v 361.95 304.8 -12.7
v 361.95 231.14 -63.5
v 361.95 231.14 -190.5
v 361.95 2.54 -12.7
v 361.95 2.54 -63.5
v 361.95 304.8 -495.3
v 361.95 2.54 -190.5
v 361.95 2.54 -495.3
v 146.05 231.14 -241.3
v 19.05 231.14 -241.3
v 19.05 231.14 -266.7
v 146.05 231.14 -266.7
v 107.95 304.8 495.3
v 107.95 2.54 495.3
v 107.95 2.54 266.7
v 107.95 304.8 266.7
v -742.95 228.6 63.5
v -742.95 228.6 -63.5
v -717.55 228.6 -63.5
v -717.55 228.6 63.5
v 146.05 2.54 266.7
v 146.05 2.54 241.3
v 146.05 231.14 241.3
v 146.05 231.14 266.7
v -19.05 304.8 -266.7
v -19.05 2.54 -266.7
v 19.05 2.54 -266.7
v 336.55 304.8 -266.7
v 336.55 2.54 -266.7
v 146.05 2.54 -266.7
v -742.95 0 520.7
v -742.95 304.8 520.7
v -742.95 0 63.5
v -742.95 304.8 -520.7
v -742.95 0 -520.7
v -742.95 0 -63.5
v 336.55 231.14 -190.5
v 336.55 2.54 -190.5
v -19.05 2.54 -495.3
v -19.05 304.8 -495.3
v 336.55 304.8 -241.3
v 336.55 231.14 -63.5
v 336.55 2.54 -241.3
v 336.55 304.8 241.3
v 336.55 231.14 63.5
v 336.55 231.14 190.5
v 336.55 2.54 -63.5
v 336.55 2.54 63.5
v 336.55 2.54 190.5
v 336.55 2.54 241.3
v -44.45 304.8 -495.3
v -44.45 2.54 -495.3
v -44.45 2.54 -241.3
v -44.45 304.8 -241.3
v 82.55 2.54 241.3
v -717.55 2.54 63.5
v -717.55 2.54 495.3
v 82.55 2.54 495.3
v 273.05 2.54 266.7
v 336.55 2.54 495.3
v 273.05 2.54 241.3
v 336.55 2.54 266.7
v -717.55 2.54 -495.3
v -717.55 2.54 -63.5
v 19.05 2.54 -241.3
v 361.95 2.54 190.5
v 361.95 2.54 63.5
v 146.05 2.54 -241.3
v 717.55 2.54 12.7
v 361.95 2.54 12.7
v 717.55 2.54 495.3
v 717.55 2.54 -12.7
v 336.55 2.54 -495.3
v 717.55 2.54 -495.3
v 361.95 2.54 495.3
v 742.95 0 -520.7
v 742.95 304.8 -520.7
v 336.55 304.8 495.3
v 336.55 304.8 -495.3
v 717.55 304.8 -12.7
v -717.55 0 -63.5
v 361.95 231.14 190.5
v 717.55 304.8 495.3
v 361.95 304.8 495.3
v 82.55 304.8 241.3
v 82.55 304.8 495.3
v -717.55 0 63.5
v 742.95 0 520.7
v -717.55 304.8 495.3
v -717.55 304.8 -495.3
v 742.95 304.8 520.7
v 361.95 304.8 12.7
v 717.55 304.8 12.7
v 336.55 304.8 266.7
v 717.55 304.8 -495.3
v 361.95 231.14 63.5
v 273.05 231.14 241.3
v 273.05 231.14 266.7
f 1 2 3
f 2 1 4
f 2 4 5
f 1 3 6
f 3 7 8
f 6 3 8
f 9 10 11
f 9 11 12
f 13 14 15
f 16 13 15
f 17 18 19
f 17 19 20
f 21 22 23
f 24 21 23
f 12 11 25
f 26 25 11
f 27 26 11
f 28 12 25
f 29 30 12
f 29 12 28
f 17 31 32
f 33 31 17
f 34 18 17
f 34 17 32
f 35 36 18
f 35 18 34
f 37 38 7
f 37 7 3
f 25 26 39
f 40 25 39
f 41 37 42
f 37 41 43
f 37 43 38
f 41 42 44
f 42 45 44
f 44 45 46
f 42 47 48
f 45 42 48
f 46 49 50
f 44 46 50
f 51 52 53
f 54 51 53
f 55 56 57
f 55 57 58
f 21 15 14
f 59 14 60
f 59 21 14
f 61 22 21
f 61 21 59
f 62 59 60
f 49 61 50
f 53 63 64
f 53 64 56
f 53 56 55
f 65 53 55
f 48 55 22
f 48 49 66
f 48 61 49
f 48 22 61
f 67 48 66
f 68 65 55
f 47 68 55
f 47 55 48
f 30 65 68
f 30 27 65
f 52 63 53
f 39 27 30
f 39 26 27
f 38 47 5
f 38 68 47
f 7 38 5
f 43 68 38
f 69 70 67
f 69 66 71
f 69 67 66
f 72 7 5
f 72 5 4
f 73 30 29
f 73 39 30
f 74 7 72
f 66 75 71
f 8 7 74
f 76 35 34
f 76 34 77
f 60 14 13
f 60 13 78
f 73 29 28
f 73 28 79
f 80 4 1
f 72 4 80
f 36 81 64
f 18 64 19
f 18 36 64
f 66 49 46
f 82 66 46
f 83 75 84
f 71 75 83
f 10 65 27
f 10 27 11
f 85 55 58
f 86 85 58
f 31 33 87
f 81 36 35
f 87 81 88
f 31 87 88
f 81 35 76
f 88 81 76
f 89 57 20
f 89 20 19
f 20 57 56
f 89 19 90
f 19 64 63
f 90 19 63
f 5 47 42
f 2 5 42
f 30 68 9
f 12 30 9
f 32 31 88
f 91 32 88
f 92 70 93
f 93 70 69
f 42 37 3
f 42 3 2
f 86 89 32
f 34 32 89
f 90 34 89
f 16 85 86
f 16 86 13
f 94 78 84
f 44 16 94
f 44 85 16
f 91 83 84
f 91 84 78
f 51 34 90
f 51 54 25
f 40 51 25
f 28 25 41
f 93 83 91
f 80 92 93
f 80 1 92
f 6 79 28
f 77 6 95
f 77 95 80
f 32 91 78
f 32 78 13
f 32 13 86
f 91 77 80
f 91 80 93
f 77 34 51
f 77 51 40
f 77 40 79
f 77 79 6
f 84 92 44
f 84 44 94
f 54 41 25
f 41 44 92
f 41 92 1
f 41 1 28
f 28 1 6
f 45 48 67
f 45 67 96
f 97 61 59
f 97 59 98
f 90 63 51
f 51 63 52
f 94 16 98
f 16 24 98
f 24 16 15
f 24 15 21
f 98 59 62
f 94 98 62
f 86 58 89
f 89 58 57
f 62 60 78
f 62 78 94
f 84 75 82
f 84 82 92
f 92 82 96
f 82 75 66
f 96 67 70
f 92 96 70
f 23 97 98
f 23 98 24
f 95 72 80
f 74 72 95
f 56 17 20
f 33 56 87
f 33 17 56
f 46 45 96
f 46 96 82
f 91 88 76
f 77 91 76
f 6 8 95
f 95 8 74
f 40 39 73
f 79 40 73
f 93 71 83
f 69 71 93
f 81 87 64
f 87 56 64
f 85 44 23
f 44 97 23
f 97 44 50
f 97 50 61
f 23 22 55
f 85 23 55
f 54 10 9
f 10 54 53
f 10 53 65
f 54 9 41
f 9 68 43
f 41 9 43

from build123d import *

# Parameters (mm, degrees)
EXTRUDE_THIN1_OUTLINE_W   = 1485.9
EXTRUDE_THIN1_OUTLINE_H   = 1041.4
EXTRUDE_THIN1_OUTLINE_W_2 = 228.6
EXTRUDE_THIN1_OUTLINE_H_2 = 228.6
EXTRUDE_THIN1_OUTLINE_W_3 = 355.6
EXTRUDE_THIN1_OUTLINE_H_3 = 482.6
EXTRUDE_THIN1_DEPTH       = 304.8
SKETCH1_5_W               = 1460.5
SKETCH1_5_H               = 1016
BOSS_EXTRUDE1_DEPTH       = 2.54
CUT_EXTRUDE1_DEPTH        = 25.4
SKETCH4_W                 = 127
SKETCH4_H                 = 228.6
CUT_EXTRUDE2_DEPTH        = 25.4
SKETCH5_W                 = 127
SKETCH5_H                 = 228.6
CUT_EXTRUDE3_DEPTH        = 25.4
SKETCH6_W                 = 127
SKETCH6_H                 = 228.6
CUT_EXTRUDE4_DEPTH        = 25.4


# Read off the part's stored shape, not the designer's step: Extrude-Thin1
with BuildPart() as part:
    # Extrude-Thin1 outline → Extrude-Thin1 (new body)
    with BuildSketch(Plane(origin=(0, 0, 0), x_dir=(1, 0, 0), z_dir=(0, 1, 0))):
        Rectangle(EXTRUDE_THIN1_OUTLINE_W, EXTRUDE_THIN1_OUTLINE_H)
        with Locations((222.25, -381)):
            Rectangle(EXTRUDE_THIN1_OUTLINE_W_2, EXTRUDE_THIN1_OUTLINE_H_2, mode=Mode.SUBTRACT)
        with Locations((539.75, -254)):
            Rectangle(EXTRUDE_THIN1_OUTLINE_W_3, EXTRUDE_THIN1_OUTLINE_H_3, mode=Mode.SUBTRACT)
        Polygon((-44.45, 495.3), (-44.45, 241.3), (336.55, 241.3), (336.55, -241.3), (82.55, -241.3), (82.55, -495.3), (-717.55, -495.3), (-717.55, 495.3), align=None, mode=Mode.SUBTRACT)
        with Locations((539.75, 254)):
            Rectangle(EXTRUDE_THIN1_OUTLINE_W_3, EXTRUDE_THIN1_OUTLINE_H_3, mode=Mode.SUBTRACT)
        with Locations((158.75, 381)):
            Rectangle(EXTRUDE_THIN1_OUTLINE_W_3, EXTRUDE_THIN1_OUTLINE_H_2, mode=Mode.SUBTRACT)
    extrude(amount=EXTRUDE_THIN1_DEPTH)

    # Sketch1<5> → Boss-Extrude1 (add)
    with BuildSketch(Plane(origin=(0, 0, 0), x_dir=(1, 0, 0), z_dir=(0, 1, 0))):
        Rectangle(SKETCH1_5_W, SKETCH1_5_H)
    extrude(amount=BOSS_EXTRUDE1_DEPTH)

    # Sketch2 → Cut-Extrude1 (cut)
    with BuildSketch(Plane.ZY.offset(742.95)):
        Polygon((-63.5, 0), (-63.5, 228.6), (63.5, 228.6), (63.5, 0), (0, 0), align=None)
    extrude(amount=-CUT_EXTRUDE1_DEPTH, mode=Mode.SUBTRACT)

    # Sketch4 → Cut-Extrude2 (cut)
    with BuildSketch(Plane.ZY.offset(-336.55)):
        with Locations((-127, 116.84)):
            Rectangle(SKETCH4_W, SKETCH4_H)
        with Locations((127, 116.84)):
            Rectangle(SKETCH4_W, SKETCH4_H)
    extrude(amount=-CUT_EXTRUDE2_DEPTH, mode=Mode.SUBTRACT)

    # Sketch5 → Cut-Extrude3 (cut)
    with BuildSketch(Plane(origin=(0, 0, 241.3), x_dir=(-1, 0, 0), z_dir=(0, 0, -1))):
        with Locations((-209.55, 116.84)):
            Rectangle(SKETCH5_W, SKETCH5_H)
    extrude(amount=-CUT_EXTRUDE3_DEPTH, mode=Mode.SUBTRACT)

    # Sketch6 → Cut-Extrude4 (cut)
    with BuildSketch(Plane.XY.offset(-241.3)):
        with Locations((82.55, 116.84)):
            Rectangle(SKETCH6_W, SKETCH6_H)
    extrude(amount=-CUT_EXTRUDE4_DEPTH, mode=Mode.SUBTRACT)


solid = part.part
